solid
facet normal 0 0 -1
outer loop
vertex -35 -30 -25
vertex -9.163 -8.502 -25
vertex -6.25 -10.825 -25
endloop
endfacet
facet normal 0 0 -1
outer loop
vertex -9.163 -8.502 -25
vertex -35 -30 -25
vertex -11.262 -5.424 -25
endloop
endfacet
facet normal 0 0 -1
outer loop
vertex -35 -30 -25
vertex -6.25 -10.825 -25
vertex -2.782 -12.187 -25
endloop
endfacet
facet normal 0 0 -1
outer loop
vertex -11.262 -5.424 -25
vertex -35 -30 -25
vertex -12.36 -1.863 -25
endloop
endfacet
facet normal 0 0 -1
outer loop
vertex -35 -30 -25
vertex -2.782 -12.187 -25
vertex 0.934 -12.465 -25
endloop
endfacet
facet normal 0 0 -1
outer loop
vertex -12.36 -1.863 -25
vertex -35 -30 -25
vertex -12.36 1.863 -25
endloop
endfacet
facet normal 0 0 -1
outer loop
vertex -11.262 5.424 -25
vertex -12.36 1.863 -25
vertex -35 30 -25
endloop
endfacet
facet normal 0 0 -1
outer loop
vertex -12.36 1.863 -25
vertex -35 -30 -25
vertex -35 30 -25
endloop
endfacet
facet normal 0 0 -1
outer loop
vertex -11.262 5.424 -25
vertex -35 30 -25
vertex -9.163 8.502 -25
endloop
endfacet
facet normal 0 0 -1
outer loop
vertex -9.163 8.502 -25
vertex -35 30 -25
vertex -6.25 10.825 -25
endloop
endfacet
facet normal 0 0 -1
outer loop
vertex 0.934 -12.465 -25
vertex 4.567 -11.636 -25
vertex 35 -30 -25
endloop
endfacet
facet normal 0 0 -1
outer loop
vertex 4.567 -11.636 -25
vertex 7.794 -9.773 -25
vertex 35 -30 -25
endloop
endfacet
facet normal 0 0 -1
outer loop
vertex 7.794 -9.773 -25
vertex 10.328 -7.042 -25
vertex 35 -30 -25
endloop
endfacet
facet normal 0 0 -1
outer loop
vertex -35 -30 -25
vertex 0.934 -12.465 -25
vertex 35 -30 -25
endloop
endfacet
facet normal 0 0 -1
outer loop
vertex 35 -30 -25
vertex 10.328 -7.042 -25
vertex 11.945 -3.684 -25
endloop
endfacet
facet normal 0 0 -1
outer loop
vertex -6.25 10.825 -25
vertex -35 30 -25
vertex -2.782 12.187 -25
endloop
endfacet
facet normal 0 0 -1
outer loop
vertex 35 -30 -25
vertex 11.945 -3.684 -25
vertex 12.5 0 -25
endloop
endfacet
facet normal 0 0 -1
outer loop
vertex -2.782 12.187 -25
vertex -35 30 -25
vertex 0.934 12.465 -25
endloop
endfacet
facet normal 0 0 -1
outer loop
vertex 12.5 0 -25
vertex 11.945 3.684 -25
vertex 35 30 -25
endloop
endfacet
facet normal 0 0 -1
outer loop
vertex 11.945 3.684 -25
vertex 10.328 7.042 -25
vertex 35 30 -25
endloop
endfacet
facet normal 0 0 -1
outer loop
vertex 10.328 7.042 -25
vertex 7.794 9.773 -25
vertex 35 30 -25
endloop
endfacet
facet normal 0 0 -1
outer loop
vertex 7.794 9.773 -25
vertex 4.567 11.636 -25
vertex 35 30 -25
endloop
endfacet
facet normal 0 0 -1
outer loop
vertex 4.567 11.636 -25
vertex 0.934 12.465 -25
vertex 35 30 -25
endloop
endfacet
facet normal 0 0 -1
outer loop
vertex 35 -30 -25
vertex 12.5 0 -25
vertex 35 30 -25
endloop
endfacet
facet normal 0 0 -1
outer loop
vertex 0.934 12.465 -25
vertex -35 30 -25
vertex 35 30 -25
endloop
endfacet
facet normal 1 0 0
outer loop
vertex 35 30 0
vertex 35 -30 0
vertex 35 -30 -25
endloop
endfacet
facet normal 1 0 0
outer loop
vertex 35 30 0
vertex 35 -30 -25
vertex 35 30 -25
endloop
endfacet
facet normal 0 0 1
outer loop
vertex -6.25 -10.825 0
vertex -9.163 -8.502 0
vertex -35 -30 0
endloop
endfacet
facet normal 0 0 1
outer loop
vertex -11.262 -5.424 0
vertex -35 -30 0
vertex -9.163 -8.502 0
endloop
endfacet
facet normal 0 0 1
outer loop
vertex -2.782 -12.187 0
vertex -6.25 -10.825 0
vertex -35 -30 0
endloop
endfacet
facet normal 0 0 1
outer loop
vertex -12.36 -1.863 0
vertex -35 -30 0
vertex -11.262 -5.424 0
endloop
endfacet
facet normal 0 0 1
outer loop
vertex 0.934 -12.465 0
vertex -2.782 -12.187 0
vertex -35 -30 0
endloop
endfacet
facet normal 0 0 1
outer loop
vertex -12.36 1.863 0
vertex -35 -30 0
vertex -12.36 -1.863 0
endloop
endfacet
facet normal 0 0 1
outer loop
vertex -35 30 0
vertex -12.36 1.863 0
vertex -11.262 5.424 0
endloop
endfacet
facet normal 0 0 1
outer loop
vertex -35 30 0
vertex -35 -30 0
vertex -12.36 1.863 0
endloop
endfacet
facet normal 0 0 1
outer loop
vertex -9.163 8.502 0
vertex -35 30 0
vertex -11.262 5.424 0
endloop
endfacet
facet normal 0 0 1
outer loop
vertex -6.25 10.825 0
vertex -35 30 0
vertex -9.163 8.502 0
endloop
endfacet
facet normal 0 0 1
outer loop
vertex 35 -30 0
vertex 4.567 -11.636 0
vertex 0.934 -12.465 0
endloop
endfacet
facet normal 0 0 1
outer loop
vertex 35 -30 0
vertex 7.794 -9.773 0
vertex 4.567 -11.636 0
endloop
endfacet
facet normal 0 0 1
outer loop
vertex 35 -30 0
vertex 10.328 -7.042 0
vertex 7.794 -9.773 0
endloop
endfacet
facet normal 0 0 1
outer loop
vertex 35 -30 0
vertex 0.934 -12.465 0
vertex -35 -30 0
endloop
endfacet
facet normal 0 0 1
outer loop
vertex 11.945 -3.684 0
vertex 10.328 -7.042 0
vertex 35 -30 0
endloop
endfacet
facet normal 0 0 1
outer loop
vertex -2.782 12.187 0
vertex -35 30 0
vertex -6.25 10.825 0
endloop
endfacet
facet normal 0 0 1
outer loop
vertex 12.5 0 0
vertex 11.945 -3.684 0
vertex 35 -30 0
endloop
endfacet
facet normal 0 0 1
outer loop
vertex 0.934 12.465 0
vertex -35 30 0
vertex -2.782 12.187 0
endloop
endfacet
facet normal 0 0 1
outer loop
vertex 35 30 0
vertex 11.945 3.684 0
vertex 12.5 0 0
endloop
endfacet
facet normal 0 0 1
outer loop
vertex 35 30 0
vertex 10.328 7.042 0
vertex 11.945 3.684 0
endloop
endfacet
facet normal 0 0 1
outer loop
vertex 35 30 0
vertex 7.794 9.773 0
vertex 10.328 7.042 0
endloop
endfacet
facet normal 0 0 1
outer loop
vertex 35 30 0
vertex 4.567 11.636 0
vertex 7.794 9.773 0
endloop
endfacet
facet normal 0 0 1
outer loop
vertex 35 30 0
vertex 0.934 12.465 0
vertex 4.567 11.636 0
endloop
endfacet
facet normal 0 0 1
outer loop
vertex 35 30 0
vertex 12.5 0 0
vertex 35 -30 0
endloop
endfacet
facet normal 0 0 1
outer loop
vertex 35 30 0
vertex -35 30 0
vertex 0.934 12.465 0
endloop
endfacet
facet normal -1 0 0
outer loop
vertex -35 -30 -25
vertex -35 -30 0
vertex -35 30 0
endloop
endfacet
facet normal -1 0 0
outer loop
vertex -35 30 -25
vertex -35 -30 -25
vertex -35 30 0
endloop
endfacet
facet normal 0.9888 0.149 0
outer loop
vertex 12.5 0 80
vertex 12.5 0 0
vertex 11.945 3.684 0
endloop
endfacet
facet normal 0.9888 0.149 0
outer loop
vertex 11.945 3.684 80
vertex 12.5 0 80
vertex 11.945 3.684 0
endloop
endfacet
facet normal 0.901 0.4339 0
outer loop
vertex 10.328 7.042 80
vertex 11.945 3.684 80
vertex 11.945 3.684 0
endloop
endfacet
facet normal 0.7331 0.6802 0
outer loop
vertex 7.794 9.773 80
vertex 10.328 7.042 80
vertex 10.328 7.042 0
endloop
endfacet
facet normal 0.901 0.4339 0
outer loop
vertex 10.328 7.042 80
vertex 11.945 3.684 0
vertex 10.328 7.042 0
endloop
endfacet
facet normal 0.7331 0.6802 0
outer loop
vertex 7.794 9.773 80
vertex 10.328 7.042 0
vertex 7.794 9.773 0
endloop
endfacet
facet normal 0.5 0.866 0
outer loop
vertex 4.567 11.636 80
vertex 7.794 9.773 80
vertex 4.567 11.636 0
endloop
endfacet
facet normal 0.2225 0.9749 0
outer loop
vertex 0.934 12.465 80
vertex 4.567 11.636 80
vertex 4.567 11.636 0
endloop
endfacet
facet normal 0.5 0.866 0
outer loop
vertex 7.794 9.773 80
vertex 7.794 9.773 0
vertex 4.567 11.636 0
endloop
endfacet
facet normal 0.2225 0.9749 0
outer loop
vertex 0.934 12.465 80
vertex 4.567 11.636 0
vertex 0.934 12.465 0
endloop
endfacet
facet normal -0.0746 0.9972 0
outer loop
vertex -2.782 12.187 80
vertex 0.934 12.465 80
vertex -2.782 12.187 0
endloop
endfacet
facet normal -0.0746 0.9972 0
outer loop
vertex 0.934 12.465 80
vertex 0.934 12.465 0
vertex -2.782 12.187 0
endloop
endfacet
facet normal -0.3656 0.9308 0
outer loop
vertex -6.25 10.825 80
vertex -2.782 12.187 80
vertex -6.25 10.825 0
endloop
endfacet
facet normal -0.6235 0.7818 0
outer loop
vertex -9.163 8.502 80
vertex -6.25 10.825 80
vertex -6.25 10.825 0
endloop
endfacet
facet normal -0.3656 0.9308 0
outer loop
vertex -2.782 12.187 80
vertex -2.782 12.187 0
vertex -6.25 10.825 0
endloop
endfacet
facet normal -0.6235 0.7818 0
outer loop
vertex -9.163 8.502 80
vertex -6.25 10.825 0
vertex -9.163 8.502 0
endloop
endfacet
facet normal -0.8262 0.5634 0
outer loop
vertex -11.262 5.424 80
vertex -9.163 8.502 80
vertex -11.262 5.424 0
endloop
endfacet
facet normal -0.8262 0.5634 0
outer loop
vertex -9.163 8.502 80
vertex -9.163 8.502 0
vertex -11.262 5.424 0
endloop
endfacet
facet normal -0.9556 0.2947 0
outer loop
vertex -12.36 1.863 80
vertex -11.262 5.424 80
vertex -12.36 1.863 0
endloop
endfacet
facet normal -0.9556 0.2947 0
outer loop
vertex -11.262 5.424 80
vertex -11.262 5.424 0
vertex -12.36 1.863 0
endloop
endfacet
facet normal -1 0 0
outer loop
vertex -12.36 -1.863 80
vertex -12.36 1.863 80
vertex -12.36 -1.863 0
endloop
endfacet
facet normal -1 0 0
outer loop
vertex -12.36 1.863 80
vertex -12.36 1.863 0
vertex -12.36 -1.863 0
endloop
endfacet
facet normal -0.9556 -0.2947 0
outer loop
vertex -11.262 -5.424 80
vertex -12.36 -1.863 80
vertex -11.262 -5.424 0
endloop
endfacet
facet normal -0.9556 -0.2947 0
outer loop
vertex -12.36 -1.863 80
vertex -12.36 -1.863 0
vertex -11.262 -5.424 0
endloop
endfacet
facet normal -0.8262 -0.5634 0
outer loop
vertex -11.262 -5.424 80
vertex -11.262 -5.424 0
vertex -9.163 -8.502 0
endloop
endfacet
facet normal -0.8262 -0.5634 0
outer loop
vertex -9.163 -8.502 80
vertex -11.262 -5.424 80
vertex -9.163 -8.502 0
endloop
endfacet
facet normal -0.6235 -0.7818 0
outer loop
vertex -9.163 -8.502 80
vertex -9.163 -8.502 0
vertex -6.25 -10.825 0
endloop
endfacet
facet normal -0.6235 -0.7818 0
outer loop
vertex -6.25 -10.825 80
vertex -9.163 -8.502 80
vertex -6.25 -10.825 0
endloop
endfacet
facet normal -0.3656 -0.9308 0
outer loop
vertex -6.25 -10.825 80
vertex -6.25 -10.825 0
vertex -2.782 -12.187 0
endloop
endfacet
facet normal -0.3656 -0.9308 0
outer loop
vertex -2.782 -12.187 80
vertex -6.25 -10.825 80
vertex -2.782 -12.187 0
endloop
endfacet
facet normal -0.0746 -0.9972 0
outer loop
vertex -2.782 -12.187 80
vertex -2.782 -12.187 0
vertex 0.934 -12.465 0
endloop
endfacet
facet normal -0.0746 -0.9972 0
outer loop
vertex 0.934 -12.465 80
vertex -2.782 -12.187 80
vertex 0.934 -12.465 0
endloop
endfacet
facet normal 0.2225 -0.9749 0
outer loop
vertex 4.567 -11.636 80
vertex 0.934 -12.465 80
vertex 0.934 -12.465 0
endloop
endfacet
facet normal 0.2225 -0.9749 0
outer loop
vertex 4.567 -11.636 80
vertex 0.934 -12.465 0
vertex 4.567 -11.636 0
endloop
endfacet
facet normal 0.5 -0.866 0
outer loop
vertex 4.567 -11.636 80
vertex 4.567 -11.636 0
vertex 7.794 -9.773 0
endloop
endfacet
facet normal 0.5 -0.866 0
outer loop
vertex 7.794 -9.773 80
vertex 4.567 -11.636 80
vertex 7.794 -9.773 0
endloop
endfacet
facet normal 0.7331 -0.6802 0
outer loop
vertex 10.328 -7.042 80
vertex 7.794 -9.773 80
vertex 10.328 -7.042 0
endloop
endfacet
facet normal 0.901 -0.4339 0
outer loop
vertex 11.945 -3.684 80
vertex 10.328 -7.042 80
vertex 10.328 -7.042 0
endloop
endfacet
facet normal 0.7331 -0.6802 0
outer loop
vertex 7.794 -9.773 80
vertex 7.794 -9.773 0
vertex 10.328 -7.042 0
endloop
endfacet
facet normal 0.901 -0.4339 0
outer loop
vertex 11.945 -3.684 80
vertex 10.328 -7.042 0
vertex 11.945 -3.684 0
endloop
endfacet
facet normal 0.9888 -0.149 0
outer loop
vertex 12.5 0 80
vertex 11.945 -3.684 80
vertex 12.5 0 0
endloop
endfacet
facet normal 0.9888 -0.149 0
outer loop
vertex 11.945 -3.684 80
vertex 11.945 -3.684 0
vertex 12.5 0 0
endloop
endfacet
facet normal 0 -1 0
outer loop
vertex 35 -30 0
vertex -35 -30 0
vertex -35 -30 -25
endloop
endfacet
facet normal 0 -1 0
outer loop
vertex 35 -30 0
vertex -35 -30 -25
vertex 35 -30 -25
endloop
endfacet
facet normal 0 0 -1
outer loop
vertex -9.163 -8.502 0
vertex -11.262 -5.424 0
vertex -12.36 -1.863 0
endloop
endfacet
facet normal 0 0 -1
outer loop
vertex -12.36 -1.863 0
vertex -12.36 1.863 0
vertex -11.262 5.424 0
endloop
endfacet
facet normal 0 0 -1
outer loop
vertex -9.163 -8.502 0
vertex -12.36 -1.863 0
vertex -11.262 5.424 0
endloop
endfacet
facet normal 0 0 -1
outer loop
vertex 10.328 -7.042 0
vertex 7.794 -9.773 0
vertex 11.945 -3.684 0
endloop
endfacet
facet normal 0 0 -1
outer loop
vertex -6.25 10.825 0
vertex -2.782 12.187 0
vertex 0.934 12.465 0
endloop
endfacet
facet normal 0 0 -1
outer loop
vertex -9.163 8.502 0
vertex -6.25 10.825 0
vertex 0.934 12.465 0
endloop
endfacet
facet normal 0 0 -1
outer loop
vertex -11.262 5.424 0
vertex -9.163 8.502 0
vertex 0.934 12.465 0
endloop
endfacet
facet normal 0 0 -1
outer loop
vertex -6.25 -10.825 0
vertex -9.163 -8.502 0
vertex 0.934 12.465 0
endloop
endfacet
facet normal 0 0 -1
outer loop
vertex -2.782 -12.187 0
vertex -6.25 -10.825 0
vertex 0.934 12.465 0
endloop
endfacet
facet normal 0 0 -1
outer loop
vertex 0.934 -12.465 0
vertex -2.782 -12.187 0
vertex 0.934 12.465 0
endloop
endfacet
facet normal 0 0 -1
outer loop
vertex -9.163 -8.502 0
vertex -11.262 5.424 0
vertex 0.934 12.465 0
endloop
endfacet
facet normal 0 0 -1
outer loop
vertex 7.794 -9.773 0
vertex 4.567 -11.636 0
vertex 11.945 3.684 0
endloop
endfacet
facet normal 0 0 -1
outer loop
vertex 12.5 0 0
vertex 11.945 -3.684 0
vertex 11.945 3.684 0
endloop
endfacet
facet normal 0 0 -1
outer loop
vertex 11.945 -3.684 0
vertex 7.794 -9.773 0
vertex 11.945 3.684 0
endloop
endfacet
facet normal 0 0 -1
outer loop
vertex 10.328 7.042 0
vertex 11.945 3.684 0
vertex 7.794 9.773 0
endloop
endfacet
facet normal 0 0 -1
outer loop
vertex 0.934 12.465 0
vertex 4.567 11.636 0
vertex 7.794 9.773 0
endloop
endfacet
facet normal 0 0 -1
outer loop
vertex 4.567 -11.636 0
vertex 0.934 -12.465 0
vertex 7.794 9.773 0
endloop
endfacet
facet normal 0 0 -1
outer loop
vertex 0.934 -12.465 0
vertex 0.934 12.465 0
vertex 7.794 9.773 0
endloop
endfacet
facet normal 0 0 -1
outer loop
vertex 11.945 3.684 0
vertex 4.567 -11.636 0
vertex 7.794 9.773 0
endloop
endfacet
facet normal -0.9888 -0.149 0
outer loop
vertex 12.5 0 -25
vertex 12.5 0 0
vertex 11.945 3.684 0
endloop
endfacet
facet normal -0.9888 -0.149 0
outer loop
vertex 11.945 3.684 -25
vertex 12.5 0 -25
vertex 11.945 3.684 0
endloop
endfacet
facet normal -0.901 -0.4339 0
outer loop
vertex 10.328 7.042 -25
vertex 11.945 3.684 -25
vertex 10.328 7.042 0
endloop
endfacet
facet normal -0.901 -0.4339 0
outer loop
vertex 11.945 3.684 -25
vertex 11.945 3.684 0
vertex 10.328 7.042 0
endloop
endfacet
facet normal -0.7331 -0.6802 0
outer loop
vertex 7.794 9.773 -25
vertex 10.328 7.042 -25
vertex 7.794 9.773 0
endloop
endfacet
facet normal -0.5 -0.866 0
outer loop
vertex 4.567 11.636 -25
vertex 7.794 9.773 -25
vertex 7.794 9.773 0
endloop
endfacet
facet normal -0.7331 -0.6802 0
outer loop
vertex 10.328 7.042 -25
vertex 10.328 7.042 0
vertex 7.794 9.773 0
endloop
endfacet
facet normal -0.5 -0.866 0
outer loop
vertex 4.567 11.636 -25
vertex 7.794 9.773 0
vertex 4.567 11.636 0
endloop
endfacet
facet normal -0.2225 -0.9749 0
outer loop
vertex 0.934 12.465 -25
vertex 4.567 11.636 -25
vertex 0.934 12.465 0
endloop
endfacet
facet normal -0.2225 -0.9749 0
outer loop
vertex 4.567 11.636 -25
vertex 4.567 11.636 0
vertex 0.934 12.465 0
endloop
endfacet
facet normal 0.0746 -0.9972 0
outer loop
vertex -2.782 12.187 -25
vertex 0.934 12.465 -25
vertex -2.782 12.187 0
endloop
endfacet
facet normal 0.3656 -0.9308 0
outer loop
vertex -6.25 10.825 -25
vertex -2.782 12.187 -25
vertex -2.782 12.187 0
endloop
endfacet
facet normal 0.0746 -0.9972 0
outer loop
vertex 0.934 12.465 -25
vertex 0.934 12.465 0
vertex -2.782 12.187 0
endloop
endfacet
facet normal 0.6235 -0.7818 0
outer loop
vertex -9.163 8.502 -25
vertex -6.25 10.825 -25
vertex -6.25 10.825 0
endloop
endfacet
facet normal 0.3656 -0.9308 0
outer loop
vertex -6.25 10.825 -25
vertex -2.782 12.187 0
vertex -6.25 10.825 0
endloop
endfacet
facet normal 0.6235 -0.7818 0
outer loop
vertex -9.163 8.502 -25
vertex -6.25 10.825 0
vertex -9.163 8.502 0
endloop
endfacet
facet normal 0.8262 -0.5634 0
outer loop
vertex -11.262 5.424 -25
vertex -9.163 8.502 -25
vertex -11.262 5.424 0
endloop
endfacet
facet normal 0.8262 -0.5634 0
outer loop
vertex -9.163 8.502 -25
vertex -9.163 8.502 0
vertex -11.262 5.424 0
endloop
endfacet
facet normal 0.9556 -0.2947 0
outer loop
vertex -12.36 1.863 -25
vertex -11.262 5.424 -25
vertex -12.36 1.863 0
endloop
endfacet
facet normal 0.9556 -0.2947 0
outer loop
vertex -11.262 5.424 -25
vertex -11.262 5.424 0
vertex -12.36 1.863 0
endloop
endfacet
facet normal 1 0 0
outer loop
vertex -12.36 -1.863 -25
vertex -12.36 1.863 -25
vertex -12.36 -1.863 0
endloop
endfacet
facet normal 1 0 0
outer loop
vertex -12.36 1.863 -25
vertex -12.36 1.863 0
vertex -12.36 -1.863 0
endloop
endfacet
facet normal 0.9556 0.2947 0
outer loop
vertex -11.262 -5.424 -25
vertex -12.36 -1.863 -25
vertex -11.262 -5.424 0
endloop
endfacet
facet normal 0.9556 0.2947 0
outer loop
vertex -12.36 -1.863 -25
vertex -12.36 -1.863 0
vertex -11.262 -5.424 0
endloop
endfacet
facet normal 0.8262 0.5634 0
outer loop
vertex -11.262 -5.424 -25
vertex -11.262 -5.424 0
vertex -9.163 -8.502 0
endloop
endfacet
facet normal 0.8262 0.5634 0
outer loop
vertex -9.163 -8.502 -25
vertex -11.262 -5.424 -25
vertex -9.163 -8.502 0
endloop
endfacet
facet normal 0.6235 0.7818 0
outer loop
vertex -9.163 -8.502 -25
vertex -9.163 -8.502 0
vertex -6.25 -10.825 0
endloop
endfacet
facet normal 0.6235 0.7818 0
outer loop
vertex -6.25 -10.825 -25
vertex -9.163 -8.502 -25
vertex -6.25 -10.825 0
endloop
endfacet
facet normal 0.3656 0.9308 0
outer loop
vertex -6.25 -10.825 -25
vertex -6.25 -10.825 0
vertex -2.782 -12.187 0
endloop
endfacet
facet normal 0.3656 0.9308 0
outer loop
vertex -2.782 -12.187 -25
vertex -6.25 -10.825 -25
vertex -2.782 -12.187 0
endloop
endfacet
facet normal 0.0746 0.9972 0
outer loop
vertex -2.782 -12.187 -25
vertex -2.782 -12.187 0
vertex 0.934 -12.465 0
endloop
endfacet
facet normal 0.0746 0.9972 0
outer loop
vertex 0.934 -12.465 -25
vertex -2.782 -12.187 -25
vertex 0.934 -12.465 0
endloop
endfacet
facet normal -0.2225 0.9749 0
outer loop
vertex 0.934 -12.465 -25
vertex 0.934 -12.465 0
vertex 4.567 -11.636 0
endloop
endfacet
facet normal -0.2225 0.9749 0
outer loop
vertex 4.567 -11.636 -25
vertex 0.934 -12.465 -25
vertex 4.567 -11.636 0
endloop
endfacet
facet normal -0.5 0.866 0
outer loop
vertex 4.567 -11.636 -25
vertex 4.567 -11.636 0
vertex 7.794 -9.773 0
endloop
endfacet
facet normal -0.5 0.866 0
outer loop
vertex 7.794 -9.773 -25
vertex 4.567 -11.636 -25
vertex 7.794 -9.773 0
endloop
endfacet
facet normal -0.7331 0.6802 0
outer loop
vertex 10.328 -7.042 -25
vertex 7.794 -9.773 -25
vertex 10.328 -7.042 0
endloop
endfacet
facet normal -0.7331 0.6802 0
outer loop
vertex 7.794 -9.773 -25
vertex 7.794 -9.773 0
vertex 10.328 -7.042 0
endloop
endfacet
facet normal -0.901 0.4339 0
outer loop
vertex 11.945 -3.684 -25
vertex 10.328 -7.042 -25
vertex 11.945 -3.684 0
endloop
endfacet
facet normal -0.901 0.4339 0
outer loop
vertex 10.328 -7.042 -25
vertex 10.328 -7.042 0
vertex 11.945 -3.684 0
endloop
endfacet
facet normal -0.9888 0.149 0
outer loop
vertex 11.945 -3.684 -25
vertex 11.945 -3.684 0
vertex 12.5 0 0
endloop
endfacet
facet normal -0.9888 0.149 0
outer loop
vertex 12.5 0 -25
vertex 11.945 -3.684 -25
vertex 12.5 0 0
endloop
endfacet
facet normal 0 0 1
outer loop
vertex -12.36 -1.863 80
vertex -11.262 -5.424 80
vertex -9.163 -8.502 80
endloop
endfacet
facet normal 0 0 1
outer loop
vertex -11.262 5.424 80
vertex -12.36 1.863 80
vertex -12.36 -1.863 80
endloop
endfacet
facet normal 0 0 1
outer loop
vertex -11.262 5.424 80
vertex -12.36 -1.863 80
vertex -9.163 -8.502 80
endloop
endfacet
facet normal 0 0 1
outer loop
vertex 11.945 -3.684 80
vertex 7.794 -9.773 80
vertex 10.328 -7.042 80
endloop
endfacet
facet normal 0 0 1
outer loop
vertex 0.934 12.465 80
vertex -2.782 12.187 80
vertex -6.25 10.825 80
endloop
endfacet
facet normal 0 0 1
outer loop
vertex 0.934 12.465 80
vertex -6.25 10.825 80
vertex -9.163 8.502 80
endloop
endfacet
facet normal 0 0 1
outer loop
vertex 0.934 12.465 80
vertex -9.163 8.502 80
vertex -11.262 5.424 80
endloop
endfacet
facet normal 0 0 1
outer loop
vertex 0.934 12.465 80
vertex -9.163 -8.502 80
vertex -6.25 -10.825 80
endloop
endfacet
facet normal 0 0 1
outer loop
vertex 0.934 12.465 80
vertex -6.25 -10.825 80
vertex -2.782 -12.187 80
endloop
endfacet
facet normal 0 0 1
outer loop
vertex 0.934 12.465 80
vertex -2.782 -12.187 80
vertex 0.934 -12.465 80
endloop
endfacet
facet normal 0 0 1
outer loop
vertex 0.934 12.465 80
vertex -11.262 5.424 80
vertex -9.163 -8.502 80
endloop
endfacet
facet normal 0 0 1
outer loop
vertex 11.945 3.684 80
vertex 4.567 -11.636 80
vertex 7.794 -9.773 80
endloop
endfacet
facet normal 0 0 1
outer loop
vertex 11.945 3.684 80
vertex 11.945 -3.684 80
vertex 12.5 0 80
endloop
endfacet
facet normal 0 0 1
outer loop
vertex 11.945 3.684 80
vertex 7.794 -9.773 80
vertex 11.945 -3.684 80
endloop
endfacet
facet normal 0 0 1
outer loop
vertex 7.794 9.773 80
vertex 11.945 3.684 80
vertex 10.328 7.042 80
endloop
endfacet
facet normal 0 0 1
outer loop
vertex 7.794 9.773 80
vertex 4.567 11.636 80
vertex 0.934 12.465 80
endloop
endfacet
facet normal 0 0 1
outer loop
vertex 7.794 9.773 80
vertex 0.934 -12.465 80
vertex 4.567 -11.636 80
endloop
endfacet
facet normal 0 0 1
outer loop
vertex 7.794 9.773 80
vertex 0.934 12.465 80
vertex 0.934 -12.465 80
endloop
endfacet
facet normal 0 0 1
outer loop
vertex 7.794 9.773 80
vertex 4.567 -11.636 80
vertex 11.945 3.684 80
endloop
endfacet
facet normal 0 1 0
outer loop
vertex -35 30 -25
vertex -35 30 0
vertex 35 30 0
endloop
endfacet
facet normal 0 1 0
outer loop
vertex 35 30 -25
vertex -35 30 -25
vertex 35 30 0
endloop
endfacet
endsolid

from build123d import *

# Parameters (mm, degrees)
F0_W     = 70
F0_H     = 60
F0_R     = 12.5
F1_DEPTH = 25
F2_R     = 12.5
F3_DEPTH = 80


with BuildPart() as f1:
    # F0 (on Top) → F1 (new body)
    with BuildSketch(Plane.XY):
        Rectangle(F0_W, F0_H)
        Circle(F0_R, mode=Mode.SUBTRACT)
    extrude(amount=-F1_DEPTH)


with BuildPart() as f3:
    # F2 (on face) → F3 (new body)
    with BuildSketch(Plane.XY):
        Circle(F2_R)
    extrude(amount=F3_DEPTH)


solid = Compound([f1.part, f3.part])
